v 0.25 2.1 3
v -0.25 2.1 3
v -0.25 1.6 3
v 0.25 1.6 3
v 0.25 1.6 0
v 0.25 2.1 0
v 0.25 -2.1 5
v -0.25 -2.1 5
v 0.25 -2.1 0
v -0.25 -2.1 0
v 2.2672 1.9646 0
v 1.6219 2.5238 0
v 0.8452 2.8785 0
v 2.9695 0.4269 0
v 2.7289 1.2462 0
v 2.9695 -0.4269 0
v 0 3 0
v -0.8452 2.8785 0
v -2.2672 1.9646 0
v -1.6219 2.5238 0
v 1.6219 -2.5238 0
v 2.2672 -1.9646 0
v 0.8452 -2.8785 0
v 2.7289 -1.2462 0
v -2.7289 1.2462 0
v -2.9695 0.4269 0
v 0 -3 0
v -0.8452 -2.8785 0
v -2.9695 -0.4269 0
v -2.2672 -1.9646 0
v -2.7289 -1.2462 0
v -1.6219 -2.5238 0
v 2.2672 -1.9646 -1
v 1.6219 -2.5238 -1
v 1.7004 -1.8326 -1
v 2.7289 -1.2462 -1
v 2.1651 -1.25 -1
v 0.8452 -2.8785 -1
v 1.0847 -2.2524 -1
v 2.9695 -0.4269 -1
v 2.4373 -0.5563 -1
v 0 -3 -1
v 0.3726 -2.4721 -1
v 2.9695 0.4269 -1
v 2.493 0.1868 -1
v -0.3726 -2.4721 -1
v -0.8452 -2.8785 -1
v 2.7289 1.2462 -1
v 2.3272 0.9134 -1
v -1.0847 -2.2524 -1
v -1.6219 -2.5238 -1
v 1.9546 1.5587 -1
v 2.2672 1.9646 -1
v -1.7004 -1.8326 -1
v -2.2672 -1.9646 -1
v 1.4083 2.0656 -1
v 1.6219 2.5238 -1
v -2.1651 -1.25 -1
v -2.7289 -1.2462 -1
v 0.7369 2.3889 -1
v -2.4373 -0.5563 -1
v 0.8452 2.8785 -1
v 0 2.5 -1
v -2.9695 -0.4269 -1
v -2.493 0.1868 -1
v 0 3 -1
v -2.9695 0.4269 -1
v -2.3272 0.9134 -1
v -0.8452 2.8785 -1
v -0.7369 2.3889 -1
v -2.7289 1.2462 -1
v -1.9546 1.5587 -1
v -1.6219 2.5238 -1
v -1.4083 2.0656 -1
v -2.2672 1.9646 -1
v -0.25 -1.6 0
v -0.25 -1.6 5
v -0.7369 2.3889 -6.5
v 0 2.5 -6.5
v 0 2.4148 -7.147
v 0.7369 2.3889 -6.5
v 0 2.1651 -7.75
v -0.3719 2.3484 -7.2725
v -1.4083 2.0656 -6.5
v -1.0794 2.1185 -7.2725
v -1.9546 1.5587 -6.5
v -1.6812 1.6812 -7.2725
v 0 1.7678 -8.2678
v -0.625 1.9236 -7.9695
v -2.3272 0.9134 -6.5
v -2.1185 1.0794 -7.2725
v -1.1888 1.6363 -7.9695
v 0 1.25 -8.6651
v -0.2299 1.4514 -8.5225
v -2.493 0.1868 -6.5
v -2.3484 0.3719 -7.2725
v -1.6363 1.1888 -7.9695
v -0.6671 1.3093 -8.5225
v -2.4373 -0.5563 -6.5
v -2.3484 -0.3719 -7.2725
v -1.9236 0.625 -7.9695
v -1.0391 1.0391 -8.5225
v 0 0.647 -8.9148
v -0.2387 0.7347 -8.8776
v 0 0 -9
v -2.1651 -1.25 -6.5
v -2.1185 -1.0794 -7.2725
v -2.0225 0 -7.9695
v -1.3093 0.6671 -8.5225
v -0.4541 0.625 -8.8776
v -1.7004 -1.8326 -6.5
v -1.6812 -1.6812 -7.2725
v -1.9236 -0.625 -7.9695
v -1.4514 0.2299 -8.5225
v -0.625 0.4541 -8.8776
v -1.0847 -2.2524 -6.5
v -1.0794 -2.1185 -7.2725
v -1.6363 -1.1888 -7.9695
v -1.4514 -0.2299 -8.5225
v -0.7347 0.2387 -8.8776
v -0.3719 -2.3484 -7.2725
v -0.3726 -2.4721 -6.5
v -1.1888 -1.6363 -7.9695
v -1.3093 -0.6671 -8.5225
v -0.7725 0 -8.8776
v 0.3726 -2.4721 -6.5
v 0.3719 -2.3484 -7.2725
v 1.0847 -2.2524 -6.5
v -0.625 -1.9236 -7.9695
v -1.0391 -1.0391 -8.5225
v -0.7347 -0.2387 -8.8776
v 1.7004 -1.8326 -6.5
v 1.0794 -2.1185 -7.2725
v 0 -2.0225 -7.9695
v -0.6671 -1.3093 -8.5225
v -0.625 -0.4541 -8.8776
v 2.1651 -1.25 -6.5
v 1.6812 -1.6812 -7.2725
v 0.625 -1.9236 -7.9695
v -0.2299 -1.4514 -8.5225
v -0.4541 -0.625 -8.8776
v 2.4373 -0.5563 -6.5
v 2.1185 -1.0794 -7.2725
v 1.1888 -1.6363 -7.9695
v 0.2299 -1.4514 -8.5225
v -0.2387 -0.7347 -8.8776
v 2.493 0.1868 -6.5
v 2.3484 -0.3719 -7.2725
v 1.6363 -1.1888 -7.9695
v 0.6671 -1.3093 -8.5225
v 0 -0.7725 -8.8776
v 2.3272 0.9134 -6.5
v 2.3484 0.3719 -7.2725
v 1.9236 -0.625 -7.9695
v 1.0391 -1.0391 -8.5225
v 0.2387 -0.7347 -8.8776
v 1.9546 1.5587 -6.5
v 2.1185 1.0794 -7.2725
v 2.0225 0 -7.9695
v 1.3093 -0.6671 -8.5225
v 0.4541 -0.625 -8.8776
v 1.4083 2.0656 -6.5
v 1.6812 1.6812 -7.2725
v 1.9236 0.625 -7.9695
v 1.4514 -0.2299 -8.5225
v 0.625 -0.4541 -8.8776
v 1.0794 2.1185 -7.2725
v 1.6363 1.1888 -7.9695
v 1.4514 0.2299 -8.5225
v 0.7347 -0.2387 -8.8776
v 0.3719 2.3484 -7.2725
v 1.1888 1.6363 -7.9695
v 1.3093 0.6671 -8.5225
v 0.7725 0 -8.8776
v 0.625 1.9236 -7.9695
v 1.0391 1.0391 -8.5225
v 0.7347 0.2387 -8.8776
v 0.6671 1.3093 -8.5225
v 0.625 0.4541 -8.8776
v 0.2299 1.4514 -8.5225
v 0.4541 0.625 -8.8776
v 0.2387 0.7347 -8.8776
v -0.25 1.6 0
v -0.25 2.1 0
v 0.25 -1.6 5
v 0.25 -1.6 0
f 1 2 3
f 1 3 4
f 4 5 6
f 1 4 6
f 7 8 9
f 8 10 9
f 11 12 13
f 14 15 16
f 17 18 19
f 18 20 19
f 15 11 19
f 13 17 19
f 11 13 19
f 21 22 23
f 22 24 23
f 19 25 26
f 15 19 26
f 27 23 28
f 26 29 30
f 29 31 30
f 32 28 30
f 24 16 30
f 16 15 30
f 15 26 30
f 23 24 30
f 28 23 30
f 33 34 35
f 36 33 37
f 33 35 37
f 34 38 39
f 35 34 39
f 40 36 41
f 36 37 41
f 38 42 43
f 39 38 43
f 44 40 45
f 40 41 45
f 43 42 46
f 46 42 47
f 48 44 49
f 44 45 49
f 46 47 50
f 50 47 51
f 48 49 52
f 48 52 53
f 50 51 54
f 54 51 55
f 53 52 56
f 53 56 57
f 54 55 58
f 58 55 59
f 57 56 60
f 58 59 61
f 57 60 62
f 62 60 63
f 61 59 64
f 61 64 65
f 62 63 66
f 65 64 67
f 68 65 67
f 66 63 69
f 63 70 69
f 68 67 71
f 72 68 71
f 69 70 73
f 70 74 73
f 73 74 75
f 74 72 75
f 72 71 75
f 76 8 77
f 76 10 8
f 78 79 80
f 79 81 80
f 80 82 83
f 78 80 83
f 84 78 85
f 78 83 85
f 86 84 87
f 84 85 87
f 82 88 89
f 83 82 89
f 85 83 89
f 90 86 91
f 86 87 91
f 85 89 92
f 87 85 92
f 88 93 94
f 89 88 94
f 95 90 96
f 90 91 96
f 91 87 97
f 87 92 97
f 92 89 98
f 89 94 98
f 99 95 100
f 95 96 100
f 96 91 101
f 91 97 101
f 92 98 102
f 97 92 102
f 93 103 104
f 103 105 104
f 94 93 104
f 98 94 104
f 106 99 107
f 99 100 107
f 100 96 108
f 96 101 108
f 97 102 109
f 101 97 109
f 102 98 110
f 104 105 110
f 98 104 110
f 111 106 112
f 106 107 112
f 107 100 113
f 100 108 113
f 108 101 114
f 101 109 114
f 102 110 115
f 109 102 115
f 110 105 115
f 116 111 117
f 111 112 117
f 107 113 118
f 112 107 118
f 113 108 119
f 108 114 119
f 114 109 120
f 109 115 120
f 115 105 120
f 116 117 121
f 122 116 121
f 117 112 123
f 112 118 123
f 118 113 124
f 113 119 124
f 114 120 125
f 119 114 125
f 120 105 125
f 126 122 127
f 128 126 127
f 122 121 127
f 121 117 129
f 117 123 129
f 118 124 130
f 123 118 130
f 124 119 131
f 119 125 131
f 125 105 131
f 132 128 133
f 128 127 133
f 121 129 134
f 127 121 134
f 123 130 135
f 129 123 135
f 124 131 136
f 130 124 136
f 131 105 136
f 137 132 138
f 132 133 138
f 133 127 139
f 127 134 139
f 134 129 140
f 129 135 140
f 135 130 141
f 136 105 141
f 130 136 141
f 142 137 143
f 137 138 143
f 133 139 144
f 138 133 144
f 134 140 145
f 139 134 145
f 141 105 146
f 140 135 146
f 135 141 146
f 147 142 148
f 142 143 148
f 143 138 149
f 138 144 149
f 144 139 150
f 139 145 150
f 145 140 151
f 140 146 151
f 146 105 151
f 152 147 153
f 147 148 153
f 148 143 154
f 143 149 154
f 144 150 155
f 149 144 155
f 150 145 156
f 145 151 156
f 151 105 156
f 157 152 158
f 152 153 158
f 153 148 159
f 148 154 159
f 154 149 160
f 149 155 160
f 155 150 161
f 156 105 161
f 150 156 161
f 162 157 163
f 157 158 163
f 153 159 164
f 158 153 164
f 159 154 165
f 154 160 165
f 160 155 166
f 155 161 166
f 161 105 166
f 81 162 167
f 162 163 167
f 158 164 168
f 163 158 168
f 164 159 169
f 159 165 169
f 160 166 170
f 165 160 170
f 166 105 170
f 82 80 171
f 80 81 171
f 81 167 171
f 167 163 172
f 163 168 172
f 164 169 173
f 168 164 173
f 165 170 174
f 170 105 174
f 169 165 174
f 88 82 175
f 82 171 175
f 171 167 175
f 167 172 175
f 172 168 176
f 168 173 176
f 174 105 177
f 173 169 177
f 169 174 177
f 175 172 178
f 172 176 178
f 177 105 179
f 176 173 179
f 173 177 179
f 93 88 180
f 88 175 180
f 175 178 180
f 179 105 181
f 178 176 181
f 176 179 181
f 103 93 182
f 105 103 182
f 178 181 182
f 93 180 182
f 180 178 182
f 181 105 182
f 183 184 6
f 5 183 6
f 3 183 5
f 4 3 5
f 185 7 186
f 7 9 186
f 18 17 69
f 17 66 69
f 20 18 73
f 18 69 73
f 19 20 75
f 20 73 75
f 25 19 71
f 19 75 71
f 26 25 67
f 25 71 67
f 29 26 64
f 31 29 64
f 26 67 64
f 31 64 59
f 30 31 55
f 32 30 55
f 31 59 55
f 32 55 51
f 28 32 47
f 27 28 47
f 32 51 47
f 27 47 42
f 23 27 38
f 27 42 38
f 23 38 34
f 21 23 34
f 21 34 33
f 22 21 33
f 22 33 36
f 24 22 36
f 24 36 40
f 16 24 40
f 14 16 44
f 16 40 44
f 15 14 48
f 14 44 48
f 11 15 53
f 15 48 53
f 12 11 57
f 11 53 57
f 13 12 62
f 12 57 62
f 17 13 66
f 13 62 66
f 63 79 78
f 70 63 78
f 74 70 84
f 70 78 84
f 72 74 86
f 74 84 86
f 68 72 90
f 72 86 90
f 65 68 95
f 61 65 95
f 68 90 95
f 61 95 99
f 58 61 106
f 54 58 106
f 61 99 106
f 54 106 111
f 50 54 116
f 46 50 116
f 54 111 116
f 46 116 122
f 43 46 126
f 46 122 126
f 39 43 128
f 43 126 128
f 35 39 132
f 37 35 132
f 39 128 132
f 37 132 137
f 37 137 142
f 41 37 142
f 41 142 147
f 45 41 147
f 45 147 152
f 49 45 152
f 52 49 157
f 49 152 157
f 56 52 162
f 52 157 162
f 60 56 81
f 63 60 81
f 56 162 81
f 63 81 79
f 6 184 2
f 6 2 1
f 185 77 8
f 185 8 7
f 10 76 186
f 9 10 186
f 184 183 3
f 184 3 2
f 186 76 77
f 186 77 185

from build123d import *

# Parameters (mm, degrees)
FILLET_1_R        = 2.5
SKETCH_2_W        = 0.5
SKETCH_2_H        = 0.5
EXTRUDE_1_DEPTH   = 3
EXTRUDE_1_2_DEPTH = 3
SKETCH_3_W        = 0.5
SKETCH_3_H        = 0.5
EXTRUDE_2_DEPTH   = 2


with BuildPart() as part:
    # Эскиз1 → Повернуть1 (revolve)
    with BuildSketch(Plane(origin=(0, 0, 0), x_dir=(0, 0, -1), z_dir=(1, 0, 0))):
        Polygon((0, 0), (0, 3), (1, 3), (1, 2.5), (9, 2.5), (9, 0), align=None)
    revolve(axis=Axis((0, 0, -9), (0, 0, 1)))

    # Скругление1
    fillet_1_edges = [part.edges().sort_by_distance(p)[0] for p in [
        (0, -2.5, -9),
    ]]
    fillet(fillet_1_edges, radius=FILLET_1_R)


with BuildPart() as body_2:
    # Эскиз2 → Бобышка-Вытянуть1 (new body)
    with BuildSketch(Plane.XY):
        with Locations((0, -1.85)):
            Rectangle(SKETCH_2_W, SKETCH_2_H)
    extrude(amount=EXTRUDE_1_DEPTH)


with BuildPart() as body_3:
    # Эскиз2 → Extrude 1 2 (new body)
    with BuildSketch(Plane.XY):
        with Locations((0, 1.85)):
            Rectangle(SKETCH_2_W, SKETCH_2_H)
    extrude(amount=EXTRUDE_1_2_DEPTH)


with BuildPart() as body_4:
    # Эскиз3 → Бобышка-Вытянуть2 (new body)
    with BuildSketch(Plane.XY.offset(3)):
        with Locations((0, -1.85)):
            Rectangle(SKETCH_3_W, SKETCH_3_H)
    extrude(amount=EXTRUDE_2_DEPTH)


with BuildPart() as body_2_1:
    add(body_2.part)

    # Combine 1: union body 4
    add(body_4.part)


solid = Compound([part.part, body_3.part, body_2_1.part])
